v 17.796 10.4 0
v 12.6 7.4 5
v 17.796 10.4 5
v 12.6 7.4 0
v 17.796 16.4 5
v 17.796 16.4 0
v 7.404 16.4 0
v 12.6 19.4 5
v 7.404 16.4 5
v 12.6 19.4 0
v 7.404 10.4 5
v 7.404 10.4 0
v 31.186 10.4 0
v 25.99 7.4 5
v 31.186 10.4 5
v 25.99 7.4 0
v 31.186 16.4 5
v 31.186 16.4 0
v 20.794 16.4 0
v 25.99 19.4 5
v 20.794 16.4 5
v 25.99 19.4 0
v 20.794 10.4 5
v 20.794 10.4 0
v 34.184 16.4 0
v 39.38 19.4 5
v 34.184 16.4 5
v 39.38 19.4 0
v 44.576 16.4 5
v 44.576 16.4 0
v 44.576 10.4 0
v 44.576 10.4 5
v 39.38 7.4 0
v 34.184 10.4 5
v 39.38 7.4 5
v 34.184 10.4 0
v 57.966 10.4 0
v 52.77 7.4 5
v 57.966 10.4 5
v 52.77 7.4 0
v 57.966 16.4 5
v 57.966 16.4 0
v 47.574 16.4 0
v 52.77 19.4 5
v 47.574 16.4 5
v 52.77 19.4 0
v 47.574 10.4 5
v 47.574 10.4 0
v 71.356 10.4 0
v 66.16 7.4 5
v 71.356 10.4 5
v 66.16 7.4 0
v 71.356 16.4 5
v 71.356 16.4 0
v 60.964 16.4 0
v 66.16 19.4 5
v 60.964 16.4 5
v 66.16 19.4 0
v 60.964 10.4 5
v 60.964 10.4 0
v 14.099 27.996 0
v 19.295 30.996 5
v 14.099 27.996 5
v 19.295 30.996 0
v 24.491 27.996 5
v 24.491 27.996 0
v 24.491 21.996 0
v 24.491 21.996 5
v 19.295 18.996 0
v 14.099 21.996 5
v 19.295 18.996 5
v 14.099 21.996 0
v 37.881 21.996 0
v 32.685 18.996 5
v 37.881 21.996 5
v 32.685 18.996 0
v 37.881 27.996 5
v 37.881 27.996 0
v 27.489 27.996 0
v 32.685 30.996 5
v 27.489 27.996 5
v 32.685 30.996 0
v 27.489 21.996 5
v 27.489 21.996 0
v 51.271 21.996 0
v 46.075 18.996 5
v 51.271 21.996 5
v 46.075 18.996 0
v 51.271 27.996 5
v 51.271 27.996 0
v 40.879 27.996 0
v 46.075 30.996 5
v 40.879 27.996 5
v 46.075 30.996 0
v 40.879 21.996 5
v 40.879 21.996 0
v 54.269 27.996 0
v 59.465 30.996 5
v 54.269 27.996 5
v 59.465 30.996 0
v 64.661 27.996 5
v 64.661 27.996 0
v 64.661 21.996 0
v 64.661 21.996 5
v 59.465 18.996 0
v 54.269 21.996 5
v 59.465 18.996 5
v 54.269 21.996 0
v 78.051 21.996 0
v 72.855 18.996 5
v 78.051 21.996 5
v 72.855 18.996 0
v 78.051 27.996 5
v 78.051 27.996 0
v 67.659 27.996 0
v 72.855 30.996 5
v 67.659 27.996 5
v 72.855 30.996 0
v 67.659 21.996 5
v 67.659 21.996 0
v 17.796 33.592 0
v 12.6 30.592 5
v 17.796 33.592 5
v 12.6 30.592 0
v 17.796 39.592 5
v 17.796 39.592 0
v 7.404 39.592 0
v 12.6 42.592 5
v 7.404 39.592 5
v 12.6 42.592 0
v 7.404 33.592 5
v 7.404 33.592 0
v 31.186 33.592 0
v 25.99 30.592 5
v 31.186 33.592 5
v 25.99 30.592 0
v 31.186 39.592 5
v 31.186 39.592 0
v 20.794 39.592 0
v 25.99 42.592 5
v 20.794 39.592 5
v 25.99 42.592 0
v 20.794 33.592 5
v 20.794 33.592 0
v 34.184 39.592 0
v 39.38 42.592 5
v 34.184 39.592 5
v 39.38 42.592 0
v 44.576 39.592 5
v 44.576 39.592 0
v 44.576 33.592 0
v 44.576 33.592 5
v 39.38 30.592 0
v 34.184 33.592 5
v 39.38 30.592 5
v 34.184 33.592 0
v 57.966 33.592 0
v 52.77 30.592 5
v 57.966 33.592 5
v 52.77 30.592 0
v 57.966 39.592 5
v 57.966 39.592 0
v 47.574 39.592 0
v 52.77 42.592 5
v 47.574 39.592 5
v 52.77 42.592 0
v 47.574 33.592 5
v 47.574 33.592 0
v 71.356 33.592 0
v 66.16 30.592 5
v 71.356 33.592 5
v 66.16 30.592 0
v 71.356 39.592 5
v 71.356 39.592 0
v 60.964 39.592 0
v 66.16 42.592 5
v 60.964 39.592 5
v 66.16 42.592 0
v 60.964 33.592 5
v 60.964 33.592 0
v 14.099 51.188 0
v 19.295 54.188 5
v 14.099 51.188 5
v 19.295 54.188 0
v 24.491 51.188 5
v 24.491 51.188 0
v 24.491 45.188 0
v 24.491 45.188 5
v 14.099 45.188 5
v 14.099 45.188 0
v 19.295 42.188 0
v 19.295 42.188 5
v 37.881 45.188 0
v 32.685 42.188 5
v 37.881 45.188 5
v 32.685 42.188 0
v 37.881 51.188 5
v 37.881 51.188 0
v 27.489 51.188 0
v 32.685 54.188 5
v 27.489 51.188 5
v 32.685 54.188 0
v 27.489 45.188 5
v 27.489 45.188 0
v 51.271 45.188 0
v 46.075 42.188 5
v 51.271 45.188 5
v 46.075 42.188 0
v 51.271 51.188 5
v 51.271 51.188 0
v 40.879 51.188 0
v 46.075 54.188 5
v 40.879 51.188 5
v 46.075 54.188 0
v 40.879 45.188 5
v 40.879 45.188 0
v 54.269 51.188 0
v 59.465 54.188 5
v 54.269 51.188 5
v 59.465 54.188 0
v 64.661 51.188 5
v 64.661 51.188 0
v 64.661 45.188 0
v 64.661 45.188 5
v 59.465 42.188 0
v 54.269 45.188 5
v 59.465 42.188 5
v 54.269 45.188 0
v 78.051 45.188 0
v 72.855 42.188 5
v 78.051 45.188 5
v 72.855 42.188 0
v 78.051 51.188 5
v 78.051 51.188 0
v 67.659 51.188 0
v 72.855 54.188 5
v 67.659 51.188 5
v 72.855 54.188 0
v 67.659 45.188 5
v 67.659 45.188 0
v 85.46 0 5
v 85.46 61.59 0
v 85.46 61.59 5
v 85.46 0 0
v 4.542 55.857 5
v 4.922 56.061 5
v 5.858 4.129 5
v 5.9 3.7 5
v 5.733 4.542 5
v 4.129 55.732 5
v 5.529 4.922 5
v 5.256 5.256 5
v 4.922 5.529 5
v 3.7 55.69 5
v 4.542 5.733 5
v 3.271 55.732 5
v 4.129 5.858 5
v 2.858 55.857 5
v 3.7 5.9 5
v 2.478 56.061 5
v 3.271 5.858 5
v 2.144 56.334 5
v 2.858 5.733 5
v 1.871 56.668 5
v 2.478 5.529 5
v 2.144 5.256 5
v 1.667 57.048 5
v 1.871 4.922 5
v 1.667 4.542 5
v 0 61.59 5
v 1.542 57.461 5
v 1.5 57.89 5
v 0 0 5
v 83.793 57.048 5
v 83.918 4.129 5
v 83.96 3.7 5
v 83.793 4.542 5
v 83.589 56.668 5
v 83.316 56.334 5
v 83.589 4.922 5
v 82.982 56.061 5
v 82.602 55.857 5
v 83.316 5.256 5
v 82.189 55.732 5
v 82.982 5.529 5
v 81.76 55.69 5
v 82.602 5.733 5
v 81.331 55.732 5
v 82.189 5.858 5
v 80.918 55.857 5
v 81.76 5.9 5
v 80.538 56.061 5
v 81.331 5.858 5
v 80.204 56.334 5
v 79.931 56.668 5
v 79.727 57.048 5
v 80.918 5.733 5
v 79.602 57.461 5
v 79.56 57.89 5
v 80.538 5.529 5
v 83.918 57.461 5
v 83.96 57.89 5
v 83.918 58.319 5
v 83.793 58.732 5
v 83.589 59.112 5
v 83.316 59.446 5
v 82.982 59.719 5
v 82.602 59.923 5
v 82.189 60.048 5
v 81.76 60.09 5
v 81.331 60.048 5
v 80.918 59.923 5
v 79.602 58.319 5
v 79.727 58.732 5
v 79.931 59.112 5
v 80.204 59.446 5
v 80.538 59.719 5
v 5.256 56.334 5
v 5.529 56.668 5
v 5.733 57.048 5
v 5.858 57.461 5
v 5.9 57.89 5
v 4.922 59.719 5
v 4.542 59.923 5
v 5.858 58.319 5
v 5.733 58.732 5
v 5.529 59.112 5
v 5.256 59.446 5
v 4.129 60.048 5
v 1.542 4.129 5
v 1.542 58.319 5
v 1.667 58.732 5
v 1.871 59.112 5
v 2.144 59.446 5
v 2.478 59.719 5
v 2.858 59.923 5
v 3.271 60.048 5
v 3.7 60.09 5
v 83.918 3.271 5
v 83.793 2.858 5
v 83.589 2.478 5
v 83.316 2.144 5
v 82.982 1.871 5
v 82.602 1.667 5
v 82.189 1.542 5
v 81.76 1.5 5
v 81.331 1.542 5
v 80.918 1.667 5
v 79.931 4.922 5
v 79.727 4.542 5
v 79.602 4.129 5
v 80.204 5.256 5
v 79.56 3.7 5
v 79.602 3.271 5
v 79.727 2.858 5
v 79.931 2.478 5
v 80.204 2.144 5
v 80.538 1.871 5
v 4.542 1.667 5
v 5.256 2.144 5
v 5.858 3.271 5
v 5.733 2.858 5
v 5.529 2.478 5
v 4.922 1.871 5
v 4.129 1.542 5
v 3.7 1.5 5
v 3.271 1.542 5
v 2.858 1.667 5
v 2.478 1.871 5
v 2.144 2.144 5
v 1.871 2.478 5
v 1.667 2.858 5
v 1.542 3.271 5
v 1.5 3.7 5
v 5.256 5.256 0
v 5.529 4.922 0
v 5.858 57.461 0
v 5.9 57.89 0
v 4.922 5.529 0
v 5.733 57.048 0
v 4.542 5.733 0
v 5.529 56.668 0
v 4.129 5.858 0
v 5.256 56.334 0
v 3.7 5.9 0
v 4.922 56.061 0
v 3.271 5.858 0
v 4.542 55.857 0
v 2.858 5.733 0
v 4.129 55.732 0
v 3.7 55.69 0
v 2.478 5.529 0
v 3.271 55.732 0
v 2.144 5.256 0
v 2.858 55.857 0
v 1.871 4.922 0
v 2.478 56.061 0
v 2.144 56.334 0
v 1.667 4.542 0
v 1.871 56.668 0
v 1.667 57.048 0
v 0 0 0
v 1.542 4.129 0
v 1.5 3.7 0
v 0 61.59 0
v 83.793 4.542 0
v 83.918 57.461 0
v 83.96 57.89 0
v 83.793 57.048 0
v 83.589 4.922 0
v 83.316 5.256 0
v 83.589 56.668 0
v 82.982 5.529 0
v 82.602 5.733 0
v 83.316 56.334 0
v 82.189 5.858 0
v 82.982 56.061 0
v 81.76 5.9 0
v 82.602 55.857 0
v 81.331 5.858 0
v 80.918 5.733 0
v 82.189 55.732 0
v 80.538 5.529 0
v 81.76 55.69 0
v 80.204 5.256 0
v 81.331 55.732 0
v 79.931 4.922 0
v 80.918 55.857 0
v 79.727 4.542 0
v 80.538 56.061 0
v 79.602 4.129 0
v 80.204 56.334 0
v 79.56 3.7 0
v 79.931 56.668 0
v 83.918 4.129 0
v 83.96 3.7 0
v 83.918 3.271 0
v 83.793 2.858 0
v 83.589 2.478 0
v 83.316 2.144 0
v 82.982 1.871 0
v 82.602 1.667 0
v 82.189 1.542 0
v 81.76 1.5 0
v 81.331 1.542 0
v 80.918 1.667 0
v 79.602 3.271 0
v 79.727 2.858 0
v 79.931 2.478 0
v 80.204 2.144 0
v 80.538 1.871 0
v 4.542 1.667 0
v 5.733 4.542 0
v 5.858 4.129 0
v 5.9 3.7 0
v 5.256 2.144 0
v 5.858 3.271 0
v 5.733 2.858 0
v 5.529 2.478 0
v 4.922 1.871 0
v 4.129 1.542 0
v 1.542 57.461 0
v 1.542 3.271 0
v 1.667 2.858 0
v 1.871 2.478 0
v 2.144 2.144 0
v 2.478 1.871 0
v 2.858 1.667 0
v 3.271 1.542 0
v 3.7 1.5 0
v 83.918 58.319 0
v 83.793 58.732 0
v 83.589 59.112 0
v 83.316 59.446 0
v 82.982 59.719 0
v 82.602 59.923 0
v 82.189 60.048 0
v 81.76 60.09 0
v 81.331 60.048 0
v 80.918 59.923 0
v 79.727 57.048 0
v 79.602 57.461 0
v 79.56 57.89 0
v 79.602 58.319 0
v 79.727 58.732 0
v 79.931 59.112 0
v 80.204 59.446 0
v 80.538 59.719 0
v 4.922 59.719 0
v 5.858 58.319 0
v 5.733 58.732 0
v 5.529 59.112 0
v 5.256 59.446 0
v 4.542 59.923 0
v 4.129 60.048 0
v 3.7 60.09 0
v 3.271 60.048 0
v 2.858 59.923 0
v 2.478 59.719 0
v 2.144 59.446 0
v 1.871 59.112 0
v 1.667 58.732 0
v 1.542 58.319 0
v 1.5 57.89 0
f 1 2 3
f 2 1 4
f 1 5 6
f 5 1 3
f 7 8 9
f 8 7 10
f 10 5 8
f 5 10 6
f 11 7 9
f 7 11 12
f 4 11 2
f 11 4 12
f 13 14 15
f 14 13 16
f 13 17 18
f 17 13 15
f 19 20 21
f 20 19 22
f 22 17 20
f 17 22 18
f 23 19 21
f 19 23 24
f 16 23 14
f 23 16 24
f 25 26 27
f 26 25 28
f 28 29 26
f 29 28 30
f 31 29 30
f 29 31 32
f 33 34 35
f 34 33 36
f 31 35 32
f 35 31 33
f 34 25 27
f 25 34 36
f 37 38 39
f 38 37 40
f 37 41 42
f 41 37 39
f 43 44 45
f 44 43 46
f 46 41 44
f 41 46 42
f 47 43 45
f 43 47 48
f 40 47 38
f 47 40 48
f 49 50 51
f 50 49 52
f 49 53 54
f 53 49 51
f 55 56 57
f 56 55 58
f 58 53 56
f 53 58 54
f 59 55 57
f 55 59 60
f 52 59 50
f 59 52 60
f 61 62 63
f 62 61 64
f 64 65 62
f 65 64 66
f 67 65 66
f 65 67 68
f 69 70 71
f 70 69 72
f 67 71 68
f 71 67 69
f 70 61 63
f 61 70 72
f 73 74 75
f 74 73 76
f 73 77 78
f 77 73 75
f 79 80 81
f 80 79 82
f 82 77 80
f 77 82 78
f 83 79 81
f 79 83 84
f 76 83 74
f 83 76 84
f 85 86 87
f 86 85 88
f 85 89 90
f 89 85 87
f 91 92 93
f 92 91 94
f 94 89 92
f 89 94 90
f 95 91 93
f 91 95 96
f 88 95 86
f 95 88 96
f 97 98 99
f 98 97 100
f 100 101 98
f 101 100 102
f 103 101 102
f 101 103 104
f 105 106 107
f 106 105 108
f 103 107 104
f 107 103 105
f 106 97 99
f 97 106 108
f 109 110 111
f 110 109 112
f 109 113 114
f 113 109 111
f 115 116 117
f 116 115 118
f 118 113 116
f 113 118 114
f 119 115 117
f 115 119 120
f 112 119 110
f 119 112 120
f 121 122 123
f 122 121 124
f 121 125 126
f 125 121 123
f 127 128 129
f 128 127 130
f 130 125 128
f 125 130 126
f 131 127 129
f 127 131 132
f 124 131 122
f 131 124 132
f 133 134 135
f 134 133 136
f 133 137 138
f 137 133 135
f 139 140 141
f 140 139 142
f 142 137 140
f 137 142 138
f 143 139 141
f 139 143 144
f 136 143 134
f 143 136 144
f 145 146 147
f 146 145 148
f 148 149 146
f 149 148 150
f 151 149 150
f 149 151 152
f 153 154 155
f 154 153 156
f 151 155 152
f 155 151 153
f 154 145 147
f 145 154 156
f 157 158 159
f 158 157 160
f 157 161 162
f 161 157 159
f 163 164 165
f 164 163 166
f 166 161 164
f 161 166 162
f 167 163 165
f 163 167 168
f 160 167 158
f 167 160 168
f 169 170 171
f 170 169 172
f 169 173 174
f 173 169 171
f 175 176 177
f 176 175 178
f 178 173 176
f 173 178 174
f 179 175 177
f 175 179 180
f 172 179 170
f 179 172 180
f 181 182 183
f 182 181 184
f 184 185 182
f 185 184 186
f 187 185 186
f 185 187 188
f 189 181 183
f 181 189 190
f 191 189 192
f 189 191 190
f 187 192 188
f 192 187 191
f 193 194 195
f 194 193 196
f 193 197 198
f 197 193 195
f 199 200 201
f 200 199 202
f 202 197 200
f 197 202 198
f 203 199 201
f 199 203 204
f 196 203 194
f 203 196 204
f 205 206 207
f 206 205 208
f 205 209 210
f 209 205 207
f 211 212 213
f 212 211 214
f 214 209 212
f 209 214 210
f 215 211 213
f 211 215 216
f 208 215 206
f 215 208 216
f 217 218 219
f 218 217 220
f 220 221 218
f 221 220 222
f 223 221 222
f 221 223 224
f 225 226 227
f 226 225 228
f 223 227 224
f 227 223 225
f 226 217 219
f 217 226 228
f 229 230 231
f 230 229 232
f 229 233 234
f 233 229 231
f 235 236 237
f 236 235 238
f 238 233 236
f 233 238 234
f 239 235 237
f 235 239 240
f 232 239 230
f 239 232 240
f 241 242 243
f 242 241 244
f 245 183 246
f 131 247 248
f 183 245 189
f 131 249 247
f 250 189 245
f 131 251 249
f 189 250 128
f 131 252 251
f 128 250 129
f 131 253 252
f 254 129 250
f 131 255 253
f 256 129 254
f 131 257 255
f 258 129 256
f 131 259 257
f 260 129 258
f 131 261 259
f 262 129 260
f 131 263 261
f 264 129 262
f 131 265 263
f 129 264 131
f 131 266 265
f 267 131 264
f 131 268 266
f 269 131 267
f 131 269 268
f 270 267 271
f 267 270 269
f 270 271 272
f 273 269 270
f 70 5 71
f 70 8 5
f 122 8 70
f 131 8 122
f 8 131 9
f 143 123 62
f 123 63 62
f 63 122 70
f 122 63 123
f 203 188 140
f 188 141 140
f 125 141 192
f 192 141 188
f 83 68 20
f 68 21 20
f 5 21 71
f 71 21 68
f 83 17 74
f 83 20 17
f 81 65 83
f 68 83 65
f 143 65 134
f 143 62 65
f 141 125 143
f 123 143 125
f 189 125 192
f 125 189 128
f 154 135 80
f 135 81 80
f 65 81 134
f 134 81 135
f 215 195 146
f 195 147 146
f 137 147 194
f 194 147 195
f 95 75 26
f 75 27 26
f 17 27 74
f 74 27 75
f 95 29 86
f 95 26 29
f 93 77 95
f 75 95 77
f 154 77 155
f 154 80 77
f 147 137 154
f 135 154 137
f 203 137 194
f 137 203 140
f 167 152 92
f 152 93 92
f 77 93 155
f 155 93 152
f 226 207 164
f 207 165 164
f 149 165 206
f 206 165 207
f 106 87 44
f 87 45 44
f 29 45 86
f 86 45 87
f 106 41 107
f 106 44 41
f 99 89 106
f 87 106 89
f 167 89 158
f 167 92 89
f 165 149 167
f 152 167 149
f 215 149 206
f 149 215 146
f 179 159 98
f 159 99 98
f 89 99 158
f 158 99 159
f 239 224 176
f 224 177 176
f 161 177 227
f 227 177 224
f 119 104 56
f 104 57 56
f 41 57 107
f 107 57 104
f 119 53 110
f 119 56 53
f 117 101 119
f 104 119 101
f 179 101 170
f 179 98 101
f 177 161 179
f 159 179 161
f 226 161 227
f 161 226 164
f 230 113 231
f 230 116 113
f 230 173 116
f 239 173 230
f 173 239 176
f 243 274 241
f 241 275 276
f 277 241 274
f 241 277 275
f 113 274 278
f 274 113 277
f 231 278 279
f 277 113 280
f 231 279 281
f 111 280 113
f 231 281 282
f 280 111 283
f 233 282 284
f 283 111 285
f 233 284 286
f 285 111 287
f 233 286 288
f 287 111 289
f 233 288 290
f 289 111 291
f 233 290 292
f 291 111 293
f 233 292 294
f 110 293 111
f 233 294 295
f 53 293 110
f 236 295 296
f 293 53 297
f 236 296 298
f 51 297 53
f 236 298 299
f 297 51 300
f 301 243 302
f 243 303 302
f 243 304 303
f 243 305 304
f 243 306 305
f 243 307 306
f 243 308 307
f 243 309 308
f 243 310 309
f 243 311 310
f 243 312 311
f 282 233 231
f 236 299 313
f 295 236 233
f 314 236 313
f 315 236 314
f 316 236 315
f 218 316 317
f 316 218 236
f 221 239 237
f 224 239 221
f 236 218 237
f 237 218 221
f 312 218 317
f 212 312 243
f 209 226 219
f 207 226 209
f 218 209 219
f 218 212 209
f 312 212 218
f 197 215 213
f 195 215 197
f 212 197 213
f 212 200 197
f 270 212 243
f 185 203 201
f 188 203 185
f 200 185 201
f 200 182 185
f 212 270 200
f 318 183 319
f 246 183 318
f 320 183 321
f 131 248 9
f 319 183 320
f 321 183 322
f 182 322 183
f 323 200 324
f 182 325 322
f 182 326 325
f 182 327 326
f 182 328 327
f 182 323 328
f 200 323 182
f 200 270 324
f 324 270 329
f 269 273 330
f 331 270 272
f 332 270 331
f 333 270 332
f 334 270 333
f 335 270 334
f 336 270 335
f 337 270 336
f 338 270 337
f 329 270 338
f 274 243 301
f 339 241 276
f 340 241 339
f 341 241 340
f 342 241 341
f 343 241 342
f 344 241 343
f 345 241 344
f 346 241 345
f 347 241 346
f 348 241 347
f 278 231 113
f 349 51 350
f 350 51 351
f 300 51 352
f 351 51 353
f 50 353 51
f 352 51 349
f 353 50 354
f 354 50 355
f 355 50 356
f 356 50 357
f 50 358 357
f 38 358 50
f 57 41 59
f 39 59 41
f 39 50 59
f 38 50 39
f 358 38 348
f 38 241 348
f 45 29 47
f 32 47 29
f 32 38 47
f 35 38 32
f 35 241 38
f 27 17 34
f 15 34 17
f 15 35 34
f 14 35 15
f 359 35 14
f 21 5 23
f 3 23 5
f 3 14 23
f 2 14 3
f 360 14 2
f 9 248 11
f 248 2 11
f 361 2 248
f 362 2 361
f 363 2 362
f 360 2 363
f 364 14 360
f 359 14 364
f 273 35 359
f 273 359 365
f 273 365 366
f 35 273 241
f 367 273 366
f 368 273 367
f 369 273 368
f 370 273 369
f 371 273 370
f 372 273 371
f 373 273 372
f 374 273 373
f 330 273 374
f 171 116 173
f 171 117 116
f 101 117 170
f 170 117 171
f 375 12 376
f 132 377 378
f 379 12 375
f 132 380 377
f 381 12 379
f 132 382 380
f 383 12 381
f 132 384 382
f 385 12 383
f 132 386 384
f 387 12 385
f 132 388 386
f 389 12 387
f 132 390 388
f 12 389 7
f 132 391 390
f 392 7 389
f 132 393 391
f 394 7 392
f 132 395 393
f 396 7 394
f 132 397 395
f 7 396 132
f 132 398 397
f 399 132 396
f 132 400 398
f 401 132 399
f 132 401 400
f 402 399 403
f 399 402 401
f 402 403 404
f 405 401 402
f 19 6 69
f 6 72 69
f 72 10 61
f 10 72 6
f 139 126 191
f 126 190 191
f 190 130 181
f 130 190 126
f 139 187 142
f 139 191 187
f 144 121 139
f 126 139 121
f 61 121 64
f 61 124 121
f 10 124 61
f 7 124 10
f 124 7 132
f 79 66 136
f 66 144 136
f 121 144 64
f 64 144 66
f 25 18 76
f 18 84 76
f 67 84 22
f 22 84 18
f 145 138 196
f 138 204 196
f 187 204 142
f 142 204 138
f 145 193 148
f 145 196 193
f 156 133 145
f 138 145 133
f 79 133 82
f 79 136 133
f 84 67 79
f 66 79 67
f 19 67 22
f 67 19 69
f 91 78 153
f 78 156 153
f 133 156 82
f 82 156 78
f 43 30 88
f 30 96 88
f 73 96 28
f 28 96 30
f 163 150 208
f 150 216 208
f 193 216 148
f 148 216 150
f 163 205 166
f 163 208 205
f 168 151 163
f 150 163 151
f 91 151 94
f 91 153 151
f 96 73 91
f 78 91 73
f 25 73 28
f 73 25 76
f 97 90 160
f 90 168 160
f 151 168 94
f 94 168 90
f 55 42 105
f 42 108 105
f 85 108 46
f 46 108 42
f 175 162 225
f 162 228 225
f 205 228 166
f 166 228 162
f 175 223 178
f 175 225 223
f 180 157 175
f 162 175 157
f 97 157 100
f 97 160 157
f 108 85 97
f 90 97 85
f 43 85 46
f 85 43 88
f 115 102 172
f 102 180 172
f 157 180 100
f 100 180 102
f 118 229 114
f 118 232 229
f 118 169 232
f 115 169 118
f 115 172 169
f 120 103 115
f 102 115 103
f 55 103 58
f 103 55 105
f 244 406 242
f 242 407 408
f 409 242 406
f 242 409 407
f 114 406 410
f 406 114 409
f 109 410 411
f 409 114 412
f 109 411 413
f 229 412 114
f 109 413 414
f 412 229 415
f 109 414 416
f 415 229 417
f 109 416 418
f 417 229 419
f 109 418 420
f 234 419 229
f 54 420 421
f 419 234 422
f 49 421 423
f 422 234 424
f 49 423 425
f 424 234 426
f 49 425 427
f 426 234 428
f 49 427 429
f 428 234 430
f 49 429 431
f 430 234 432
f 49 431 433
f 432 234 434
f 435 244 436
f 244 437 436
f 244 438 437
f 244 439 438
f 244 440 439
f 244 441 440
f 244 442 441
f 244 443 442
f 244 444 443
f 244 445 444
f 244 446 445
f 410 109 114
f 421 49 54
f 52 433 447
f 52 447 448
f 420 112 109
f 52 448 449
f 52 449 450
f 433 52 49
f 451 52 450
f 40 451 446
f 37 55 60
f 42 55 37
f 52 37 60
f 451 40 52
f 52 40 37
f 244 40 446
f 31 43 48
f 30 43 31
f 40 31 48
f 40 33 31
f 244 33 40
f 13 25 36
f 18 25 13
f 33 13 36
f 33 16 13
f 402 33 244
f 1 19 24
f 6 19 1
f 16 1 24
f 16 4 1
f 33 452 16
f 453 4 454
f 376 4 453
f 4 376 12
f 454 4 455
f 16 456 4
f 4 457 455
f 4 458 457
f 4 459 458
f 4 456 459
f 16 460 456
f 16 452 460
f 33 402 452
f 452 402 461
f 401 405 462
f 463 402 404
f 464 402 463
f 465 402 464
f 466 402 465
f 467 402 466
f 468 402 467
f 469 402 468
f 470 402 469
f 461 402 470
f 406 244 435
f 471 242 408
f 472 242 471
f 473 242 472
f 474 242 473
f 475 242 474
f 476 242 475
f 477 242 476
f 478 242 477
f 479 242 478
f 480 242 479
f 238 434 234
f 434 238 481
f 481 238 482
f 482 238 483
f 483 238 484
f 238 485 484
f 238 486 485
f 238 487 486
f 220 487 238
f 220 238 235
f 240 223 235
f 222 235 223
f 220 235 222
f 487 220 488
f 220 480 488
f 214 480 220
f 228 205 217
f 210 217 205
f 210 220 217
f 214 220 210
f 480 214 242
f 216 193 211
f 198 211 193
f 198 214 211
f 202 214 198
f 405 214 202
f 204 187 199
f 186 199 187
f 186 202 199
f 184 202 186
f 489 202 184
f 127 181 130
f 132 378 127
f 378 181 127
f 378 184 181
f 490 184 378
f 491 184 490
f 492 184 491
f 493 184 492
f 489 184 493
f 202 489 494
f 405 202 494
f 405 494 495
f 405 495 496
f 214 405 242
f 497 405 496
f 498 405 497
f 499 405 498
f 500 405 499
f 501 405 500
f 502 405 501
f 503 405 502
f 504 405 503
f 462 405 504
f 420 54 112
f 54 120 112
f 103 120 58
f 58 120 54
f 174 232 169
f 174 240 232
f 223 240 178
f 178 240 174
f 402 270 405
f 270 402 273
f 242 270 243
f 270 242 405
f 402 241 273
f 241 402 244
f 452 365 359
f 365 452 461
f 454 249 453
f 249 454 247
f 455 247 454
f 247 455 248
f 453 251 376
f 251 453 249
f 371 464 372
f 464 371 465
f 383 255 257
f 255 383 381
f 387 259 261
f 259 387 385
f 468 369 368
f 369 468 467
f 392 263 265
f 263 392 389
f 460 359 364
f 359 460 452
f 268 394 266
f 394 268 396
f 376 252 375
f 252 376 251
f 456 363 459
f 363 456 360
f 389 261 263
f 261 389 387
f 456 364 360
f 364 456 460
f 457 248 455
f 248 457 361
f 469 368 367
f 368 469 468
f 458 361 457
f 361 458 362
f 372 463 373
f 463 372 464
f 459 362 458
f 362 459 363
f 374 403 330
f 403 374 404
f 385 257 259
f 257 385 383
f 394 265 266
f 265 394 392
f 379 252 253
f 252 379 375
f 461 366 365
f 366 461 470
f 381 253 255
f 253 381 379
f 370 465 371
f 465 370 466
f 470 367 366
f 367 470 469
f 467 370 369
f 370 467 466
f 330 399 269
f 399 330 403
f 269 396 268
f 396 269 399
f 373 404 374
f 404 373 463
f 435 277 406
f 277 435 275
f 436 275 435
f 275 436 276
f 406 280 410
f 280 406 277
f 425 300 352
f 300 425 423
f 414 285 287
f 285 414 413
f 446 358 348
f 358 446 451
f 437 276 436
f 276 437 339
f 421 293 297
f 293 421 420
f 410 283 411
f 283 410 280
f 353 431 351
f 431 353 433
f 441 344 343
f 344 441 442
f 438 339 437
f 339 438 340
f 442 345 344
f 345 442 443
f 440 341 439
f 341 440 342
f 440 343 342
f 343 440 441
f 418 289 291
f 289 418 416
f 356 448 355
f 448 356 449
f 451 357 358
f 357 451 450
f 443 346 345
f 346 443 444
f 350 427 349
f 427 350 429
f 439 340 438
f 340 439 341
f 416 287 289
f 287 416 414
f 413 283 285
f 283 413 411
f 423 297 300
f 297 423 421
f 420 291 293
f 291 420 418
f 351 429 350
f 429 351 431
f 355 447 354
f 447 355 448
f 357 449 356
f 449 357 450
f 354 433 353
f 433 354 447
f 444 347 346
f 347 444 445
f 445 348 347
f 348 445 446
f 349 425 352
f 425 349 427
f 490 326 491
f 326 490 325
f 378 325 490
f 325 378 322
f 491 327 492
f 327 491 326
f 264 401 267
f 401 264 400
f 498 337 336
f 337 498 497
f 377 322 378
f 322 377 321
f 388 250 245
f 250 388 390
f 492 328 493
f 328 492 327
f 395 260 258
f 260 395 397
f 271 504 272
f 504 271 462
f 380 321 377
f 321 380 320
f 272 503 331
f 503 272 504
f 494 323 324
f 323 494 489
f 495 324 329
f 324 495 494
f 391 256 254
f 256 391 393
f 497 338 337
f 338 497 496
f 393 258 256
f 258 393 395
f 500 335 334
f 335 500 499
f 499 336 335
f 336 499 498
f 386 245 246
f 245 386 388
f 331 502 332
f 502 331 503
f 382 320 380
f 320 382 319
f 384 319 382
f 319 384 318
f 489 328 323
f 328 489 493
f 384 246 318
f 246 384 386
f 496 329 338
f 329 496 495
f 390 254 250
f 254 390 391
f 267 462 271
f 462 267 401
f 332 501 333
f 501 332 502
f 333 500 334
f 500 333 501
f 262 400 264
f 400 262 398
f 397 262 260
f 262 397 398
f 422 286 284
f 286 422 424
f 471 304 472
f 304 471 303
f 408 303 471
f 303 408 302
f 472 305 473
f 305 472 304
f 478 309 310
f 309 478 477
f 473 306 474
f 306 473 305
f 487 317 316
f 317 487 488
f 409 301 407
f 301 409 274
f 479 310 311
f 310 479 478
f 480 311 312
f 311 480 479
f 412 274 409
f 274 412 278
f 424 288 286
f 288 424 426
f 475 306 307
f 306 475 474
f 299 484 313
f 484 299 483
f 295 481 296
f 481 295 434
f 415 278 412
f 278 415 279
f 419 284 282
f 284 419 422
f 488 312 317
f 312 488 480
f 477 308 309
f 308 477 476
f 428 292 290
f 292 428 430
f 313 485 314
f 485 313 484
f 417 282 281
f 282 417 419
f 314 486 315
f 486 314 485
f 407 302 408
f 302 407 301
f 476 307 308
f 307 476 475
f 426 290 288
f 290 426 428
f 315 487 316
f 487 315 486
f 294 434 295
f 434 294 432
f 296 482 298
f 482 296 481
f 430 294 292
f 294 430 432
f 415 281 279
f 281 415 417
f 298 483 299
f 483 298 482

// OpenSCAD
$fn = 32;

// ----------------------------------------------------------------------
// Honeycomb panel: 85.46 x 61.59 mm, 20 cells of 12 mm
// ----------------------------------------------------------------------

// --- parameters (mm) ---
panel_w = 85.46;          // panel width
panel_d = 61.59;          // panel depth
thick = 5;                // panel thickness
cell_r = 6;               // hex cell circumradius
pitch = 13.39;            // hex cell pitch (centre to centre)
web = 3;                  // web between the cells
columns = 5;              // columns of cells
rows = 4;                 // rows of cells
cell_count = 20;          // total cells
shift_x = 12.6;           // first cell offset in x
shift_y = 13.4;           // first cell offset in y
mount_d = 4.4;            // corner mounting holes
hole_off = 3.7;           // mounting hole offset from the corners

difference() {
  union() {
    cube([panel_w, panel_d, thick]);
  }
  /* hexagonal cells, point-up, cut right through the plate */
  for (row = [0 : rows - 1]) {
    for (col = [0 : columns - 1]) {
      translate([shift_x + col * pitch + (row % 2) * pitch / 2, shift_y + row * pitch * 0.866025, -2.5]) rotate([0, 0, 30]) cylinder(h = thick + 5, d = 2 * cell_r, $fn = 6);
    }
  }
  /* corner mounting holes, clear of the outer cell web */
  translate([3.7, 3.7, -2.5]) cylinder(h = thick + 5, d = mount_d);
  translate([81.76, 3.7, -2.5]) cylinder(h = thick + 5, d = mount_d);
  translate([3.7, 57.89, -2.5]) cylinder(h = thick + 5, d = mount_d);
  translate([81.76, 57.89, -2.5]) cylinder(h = thick + 5, d = mount_d);
}
